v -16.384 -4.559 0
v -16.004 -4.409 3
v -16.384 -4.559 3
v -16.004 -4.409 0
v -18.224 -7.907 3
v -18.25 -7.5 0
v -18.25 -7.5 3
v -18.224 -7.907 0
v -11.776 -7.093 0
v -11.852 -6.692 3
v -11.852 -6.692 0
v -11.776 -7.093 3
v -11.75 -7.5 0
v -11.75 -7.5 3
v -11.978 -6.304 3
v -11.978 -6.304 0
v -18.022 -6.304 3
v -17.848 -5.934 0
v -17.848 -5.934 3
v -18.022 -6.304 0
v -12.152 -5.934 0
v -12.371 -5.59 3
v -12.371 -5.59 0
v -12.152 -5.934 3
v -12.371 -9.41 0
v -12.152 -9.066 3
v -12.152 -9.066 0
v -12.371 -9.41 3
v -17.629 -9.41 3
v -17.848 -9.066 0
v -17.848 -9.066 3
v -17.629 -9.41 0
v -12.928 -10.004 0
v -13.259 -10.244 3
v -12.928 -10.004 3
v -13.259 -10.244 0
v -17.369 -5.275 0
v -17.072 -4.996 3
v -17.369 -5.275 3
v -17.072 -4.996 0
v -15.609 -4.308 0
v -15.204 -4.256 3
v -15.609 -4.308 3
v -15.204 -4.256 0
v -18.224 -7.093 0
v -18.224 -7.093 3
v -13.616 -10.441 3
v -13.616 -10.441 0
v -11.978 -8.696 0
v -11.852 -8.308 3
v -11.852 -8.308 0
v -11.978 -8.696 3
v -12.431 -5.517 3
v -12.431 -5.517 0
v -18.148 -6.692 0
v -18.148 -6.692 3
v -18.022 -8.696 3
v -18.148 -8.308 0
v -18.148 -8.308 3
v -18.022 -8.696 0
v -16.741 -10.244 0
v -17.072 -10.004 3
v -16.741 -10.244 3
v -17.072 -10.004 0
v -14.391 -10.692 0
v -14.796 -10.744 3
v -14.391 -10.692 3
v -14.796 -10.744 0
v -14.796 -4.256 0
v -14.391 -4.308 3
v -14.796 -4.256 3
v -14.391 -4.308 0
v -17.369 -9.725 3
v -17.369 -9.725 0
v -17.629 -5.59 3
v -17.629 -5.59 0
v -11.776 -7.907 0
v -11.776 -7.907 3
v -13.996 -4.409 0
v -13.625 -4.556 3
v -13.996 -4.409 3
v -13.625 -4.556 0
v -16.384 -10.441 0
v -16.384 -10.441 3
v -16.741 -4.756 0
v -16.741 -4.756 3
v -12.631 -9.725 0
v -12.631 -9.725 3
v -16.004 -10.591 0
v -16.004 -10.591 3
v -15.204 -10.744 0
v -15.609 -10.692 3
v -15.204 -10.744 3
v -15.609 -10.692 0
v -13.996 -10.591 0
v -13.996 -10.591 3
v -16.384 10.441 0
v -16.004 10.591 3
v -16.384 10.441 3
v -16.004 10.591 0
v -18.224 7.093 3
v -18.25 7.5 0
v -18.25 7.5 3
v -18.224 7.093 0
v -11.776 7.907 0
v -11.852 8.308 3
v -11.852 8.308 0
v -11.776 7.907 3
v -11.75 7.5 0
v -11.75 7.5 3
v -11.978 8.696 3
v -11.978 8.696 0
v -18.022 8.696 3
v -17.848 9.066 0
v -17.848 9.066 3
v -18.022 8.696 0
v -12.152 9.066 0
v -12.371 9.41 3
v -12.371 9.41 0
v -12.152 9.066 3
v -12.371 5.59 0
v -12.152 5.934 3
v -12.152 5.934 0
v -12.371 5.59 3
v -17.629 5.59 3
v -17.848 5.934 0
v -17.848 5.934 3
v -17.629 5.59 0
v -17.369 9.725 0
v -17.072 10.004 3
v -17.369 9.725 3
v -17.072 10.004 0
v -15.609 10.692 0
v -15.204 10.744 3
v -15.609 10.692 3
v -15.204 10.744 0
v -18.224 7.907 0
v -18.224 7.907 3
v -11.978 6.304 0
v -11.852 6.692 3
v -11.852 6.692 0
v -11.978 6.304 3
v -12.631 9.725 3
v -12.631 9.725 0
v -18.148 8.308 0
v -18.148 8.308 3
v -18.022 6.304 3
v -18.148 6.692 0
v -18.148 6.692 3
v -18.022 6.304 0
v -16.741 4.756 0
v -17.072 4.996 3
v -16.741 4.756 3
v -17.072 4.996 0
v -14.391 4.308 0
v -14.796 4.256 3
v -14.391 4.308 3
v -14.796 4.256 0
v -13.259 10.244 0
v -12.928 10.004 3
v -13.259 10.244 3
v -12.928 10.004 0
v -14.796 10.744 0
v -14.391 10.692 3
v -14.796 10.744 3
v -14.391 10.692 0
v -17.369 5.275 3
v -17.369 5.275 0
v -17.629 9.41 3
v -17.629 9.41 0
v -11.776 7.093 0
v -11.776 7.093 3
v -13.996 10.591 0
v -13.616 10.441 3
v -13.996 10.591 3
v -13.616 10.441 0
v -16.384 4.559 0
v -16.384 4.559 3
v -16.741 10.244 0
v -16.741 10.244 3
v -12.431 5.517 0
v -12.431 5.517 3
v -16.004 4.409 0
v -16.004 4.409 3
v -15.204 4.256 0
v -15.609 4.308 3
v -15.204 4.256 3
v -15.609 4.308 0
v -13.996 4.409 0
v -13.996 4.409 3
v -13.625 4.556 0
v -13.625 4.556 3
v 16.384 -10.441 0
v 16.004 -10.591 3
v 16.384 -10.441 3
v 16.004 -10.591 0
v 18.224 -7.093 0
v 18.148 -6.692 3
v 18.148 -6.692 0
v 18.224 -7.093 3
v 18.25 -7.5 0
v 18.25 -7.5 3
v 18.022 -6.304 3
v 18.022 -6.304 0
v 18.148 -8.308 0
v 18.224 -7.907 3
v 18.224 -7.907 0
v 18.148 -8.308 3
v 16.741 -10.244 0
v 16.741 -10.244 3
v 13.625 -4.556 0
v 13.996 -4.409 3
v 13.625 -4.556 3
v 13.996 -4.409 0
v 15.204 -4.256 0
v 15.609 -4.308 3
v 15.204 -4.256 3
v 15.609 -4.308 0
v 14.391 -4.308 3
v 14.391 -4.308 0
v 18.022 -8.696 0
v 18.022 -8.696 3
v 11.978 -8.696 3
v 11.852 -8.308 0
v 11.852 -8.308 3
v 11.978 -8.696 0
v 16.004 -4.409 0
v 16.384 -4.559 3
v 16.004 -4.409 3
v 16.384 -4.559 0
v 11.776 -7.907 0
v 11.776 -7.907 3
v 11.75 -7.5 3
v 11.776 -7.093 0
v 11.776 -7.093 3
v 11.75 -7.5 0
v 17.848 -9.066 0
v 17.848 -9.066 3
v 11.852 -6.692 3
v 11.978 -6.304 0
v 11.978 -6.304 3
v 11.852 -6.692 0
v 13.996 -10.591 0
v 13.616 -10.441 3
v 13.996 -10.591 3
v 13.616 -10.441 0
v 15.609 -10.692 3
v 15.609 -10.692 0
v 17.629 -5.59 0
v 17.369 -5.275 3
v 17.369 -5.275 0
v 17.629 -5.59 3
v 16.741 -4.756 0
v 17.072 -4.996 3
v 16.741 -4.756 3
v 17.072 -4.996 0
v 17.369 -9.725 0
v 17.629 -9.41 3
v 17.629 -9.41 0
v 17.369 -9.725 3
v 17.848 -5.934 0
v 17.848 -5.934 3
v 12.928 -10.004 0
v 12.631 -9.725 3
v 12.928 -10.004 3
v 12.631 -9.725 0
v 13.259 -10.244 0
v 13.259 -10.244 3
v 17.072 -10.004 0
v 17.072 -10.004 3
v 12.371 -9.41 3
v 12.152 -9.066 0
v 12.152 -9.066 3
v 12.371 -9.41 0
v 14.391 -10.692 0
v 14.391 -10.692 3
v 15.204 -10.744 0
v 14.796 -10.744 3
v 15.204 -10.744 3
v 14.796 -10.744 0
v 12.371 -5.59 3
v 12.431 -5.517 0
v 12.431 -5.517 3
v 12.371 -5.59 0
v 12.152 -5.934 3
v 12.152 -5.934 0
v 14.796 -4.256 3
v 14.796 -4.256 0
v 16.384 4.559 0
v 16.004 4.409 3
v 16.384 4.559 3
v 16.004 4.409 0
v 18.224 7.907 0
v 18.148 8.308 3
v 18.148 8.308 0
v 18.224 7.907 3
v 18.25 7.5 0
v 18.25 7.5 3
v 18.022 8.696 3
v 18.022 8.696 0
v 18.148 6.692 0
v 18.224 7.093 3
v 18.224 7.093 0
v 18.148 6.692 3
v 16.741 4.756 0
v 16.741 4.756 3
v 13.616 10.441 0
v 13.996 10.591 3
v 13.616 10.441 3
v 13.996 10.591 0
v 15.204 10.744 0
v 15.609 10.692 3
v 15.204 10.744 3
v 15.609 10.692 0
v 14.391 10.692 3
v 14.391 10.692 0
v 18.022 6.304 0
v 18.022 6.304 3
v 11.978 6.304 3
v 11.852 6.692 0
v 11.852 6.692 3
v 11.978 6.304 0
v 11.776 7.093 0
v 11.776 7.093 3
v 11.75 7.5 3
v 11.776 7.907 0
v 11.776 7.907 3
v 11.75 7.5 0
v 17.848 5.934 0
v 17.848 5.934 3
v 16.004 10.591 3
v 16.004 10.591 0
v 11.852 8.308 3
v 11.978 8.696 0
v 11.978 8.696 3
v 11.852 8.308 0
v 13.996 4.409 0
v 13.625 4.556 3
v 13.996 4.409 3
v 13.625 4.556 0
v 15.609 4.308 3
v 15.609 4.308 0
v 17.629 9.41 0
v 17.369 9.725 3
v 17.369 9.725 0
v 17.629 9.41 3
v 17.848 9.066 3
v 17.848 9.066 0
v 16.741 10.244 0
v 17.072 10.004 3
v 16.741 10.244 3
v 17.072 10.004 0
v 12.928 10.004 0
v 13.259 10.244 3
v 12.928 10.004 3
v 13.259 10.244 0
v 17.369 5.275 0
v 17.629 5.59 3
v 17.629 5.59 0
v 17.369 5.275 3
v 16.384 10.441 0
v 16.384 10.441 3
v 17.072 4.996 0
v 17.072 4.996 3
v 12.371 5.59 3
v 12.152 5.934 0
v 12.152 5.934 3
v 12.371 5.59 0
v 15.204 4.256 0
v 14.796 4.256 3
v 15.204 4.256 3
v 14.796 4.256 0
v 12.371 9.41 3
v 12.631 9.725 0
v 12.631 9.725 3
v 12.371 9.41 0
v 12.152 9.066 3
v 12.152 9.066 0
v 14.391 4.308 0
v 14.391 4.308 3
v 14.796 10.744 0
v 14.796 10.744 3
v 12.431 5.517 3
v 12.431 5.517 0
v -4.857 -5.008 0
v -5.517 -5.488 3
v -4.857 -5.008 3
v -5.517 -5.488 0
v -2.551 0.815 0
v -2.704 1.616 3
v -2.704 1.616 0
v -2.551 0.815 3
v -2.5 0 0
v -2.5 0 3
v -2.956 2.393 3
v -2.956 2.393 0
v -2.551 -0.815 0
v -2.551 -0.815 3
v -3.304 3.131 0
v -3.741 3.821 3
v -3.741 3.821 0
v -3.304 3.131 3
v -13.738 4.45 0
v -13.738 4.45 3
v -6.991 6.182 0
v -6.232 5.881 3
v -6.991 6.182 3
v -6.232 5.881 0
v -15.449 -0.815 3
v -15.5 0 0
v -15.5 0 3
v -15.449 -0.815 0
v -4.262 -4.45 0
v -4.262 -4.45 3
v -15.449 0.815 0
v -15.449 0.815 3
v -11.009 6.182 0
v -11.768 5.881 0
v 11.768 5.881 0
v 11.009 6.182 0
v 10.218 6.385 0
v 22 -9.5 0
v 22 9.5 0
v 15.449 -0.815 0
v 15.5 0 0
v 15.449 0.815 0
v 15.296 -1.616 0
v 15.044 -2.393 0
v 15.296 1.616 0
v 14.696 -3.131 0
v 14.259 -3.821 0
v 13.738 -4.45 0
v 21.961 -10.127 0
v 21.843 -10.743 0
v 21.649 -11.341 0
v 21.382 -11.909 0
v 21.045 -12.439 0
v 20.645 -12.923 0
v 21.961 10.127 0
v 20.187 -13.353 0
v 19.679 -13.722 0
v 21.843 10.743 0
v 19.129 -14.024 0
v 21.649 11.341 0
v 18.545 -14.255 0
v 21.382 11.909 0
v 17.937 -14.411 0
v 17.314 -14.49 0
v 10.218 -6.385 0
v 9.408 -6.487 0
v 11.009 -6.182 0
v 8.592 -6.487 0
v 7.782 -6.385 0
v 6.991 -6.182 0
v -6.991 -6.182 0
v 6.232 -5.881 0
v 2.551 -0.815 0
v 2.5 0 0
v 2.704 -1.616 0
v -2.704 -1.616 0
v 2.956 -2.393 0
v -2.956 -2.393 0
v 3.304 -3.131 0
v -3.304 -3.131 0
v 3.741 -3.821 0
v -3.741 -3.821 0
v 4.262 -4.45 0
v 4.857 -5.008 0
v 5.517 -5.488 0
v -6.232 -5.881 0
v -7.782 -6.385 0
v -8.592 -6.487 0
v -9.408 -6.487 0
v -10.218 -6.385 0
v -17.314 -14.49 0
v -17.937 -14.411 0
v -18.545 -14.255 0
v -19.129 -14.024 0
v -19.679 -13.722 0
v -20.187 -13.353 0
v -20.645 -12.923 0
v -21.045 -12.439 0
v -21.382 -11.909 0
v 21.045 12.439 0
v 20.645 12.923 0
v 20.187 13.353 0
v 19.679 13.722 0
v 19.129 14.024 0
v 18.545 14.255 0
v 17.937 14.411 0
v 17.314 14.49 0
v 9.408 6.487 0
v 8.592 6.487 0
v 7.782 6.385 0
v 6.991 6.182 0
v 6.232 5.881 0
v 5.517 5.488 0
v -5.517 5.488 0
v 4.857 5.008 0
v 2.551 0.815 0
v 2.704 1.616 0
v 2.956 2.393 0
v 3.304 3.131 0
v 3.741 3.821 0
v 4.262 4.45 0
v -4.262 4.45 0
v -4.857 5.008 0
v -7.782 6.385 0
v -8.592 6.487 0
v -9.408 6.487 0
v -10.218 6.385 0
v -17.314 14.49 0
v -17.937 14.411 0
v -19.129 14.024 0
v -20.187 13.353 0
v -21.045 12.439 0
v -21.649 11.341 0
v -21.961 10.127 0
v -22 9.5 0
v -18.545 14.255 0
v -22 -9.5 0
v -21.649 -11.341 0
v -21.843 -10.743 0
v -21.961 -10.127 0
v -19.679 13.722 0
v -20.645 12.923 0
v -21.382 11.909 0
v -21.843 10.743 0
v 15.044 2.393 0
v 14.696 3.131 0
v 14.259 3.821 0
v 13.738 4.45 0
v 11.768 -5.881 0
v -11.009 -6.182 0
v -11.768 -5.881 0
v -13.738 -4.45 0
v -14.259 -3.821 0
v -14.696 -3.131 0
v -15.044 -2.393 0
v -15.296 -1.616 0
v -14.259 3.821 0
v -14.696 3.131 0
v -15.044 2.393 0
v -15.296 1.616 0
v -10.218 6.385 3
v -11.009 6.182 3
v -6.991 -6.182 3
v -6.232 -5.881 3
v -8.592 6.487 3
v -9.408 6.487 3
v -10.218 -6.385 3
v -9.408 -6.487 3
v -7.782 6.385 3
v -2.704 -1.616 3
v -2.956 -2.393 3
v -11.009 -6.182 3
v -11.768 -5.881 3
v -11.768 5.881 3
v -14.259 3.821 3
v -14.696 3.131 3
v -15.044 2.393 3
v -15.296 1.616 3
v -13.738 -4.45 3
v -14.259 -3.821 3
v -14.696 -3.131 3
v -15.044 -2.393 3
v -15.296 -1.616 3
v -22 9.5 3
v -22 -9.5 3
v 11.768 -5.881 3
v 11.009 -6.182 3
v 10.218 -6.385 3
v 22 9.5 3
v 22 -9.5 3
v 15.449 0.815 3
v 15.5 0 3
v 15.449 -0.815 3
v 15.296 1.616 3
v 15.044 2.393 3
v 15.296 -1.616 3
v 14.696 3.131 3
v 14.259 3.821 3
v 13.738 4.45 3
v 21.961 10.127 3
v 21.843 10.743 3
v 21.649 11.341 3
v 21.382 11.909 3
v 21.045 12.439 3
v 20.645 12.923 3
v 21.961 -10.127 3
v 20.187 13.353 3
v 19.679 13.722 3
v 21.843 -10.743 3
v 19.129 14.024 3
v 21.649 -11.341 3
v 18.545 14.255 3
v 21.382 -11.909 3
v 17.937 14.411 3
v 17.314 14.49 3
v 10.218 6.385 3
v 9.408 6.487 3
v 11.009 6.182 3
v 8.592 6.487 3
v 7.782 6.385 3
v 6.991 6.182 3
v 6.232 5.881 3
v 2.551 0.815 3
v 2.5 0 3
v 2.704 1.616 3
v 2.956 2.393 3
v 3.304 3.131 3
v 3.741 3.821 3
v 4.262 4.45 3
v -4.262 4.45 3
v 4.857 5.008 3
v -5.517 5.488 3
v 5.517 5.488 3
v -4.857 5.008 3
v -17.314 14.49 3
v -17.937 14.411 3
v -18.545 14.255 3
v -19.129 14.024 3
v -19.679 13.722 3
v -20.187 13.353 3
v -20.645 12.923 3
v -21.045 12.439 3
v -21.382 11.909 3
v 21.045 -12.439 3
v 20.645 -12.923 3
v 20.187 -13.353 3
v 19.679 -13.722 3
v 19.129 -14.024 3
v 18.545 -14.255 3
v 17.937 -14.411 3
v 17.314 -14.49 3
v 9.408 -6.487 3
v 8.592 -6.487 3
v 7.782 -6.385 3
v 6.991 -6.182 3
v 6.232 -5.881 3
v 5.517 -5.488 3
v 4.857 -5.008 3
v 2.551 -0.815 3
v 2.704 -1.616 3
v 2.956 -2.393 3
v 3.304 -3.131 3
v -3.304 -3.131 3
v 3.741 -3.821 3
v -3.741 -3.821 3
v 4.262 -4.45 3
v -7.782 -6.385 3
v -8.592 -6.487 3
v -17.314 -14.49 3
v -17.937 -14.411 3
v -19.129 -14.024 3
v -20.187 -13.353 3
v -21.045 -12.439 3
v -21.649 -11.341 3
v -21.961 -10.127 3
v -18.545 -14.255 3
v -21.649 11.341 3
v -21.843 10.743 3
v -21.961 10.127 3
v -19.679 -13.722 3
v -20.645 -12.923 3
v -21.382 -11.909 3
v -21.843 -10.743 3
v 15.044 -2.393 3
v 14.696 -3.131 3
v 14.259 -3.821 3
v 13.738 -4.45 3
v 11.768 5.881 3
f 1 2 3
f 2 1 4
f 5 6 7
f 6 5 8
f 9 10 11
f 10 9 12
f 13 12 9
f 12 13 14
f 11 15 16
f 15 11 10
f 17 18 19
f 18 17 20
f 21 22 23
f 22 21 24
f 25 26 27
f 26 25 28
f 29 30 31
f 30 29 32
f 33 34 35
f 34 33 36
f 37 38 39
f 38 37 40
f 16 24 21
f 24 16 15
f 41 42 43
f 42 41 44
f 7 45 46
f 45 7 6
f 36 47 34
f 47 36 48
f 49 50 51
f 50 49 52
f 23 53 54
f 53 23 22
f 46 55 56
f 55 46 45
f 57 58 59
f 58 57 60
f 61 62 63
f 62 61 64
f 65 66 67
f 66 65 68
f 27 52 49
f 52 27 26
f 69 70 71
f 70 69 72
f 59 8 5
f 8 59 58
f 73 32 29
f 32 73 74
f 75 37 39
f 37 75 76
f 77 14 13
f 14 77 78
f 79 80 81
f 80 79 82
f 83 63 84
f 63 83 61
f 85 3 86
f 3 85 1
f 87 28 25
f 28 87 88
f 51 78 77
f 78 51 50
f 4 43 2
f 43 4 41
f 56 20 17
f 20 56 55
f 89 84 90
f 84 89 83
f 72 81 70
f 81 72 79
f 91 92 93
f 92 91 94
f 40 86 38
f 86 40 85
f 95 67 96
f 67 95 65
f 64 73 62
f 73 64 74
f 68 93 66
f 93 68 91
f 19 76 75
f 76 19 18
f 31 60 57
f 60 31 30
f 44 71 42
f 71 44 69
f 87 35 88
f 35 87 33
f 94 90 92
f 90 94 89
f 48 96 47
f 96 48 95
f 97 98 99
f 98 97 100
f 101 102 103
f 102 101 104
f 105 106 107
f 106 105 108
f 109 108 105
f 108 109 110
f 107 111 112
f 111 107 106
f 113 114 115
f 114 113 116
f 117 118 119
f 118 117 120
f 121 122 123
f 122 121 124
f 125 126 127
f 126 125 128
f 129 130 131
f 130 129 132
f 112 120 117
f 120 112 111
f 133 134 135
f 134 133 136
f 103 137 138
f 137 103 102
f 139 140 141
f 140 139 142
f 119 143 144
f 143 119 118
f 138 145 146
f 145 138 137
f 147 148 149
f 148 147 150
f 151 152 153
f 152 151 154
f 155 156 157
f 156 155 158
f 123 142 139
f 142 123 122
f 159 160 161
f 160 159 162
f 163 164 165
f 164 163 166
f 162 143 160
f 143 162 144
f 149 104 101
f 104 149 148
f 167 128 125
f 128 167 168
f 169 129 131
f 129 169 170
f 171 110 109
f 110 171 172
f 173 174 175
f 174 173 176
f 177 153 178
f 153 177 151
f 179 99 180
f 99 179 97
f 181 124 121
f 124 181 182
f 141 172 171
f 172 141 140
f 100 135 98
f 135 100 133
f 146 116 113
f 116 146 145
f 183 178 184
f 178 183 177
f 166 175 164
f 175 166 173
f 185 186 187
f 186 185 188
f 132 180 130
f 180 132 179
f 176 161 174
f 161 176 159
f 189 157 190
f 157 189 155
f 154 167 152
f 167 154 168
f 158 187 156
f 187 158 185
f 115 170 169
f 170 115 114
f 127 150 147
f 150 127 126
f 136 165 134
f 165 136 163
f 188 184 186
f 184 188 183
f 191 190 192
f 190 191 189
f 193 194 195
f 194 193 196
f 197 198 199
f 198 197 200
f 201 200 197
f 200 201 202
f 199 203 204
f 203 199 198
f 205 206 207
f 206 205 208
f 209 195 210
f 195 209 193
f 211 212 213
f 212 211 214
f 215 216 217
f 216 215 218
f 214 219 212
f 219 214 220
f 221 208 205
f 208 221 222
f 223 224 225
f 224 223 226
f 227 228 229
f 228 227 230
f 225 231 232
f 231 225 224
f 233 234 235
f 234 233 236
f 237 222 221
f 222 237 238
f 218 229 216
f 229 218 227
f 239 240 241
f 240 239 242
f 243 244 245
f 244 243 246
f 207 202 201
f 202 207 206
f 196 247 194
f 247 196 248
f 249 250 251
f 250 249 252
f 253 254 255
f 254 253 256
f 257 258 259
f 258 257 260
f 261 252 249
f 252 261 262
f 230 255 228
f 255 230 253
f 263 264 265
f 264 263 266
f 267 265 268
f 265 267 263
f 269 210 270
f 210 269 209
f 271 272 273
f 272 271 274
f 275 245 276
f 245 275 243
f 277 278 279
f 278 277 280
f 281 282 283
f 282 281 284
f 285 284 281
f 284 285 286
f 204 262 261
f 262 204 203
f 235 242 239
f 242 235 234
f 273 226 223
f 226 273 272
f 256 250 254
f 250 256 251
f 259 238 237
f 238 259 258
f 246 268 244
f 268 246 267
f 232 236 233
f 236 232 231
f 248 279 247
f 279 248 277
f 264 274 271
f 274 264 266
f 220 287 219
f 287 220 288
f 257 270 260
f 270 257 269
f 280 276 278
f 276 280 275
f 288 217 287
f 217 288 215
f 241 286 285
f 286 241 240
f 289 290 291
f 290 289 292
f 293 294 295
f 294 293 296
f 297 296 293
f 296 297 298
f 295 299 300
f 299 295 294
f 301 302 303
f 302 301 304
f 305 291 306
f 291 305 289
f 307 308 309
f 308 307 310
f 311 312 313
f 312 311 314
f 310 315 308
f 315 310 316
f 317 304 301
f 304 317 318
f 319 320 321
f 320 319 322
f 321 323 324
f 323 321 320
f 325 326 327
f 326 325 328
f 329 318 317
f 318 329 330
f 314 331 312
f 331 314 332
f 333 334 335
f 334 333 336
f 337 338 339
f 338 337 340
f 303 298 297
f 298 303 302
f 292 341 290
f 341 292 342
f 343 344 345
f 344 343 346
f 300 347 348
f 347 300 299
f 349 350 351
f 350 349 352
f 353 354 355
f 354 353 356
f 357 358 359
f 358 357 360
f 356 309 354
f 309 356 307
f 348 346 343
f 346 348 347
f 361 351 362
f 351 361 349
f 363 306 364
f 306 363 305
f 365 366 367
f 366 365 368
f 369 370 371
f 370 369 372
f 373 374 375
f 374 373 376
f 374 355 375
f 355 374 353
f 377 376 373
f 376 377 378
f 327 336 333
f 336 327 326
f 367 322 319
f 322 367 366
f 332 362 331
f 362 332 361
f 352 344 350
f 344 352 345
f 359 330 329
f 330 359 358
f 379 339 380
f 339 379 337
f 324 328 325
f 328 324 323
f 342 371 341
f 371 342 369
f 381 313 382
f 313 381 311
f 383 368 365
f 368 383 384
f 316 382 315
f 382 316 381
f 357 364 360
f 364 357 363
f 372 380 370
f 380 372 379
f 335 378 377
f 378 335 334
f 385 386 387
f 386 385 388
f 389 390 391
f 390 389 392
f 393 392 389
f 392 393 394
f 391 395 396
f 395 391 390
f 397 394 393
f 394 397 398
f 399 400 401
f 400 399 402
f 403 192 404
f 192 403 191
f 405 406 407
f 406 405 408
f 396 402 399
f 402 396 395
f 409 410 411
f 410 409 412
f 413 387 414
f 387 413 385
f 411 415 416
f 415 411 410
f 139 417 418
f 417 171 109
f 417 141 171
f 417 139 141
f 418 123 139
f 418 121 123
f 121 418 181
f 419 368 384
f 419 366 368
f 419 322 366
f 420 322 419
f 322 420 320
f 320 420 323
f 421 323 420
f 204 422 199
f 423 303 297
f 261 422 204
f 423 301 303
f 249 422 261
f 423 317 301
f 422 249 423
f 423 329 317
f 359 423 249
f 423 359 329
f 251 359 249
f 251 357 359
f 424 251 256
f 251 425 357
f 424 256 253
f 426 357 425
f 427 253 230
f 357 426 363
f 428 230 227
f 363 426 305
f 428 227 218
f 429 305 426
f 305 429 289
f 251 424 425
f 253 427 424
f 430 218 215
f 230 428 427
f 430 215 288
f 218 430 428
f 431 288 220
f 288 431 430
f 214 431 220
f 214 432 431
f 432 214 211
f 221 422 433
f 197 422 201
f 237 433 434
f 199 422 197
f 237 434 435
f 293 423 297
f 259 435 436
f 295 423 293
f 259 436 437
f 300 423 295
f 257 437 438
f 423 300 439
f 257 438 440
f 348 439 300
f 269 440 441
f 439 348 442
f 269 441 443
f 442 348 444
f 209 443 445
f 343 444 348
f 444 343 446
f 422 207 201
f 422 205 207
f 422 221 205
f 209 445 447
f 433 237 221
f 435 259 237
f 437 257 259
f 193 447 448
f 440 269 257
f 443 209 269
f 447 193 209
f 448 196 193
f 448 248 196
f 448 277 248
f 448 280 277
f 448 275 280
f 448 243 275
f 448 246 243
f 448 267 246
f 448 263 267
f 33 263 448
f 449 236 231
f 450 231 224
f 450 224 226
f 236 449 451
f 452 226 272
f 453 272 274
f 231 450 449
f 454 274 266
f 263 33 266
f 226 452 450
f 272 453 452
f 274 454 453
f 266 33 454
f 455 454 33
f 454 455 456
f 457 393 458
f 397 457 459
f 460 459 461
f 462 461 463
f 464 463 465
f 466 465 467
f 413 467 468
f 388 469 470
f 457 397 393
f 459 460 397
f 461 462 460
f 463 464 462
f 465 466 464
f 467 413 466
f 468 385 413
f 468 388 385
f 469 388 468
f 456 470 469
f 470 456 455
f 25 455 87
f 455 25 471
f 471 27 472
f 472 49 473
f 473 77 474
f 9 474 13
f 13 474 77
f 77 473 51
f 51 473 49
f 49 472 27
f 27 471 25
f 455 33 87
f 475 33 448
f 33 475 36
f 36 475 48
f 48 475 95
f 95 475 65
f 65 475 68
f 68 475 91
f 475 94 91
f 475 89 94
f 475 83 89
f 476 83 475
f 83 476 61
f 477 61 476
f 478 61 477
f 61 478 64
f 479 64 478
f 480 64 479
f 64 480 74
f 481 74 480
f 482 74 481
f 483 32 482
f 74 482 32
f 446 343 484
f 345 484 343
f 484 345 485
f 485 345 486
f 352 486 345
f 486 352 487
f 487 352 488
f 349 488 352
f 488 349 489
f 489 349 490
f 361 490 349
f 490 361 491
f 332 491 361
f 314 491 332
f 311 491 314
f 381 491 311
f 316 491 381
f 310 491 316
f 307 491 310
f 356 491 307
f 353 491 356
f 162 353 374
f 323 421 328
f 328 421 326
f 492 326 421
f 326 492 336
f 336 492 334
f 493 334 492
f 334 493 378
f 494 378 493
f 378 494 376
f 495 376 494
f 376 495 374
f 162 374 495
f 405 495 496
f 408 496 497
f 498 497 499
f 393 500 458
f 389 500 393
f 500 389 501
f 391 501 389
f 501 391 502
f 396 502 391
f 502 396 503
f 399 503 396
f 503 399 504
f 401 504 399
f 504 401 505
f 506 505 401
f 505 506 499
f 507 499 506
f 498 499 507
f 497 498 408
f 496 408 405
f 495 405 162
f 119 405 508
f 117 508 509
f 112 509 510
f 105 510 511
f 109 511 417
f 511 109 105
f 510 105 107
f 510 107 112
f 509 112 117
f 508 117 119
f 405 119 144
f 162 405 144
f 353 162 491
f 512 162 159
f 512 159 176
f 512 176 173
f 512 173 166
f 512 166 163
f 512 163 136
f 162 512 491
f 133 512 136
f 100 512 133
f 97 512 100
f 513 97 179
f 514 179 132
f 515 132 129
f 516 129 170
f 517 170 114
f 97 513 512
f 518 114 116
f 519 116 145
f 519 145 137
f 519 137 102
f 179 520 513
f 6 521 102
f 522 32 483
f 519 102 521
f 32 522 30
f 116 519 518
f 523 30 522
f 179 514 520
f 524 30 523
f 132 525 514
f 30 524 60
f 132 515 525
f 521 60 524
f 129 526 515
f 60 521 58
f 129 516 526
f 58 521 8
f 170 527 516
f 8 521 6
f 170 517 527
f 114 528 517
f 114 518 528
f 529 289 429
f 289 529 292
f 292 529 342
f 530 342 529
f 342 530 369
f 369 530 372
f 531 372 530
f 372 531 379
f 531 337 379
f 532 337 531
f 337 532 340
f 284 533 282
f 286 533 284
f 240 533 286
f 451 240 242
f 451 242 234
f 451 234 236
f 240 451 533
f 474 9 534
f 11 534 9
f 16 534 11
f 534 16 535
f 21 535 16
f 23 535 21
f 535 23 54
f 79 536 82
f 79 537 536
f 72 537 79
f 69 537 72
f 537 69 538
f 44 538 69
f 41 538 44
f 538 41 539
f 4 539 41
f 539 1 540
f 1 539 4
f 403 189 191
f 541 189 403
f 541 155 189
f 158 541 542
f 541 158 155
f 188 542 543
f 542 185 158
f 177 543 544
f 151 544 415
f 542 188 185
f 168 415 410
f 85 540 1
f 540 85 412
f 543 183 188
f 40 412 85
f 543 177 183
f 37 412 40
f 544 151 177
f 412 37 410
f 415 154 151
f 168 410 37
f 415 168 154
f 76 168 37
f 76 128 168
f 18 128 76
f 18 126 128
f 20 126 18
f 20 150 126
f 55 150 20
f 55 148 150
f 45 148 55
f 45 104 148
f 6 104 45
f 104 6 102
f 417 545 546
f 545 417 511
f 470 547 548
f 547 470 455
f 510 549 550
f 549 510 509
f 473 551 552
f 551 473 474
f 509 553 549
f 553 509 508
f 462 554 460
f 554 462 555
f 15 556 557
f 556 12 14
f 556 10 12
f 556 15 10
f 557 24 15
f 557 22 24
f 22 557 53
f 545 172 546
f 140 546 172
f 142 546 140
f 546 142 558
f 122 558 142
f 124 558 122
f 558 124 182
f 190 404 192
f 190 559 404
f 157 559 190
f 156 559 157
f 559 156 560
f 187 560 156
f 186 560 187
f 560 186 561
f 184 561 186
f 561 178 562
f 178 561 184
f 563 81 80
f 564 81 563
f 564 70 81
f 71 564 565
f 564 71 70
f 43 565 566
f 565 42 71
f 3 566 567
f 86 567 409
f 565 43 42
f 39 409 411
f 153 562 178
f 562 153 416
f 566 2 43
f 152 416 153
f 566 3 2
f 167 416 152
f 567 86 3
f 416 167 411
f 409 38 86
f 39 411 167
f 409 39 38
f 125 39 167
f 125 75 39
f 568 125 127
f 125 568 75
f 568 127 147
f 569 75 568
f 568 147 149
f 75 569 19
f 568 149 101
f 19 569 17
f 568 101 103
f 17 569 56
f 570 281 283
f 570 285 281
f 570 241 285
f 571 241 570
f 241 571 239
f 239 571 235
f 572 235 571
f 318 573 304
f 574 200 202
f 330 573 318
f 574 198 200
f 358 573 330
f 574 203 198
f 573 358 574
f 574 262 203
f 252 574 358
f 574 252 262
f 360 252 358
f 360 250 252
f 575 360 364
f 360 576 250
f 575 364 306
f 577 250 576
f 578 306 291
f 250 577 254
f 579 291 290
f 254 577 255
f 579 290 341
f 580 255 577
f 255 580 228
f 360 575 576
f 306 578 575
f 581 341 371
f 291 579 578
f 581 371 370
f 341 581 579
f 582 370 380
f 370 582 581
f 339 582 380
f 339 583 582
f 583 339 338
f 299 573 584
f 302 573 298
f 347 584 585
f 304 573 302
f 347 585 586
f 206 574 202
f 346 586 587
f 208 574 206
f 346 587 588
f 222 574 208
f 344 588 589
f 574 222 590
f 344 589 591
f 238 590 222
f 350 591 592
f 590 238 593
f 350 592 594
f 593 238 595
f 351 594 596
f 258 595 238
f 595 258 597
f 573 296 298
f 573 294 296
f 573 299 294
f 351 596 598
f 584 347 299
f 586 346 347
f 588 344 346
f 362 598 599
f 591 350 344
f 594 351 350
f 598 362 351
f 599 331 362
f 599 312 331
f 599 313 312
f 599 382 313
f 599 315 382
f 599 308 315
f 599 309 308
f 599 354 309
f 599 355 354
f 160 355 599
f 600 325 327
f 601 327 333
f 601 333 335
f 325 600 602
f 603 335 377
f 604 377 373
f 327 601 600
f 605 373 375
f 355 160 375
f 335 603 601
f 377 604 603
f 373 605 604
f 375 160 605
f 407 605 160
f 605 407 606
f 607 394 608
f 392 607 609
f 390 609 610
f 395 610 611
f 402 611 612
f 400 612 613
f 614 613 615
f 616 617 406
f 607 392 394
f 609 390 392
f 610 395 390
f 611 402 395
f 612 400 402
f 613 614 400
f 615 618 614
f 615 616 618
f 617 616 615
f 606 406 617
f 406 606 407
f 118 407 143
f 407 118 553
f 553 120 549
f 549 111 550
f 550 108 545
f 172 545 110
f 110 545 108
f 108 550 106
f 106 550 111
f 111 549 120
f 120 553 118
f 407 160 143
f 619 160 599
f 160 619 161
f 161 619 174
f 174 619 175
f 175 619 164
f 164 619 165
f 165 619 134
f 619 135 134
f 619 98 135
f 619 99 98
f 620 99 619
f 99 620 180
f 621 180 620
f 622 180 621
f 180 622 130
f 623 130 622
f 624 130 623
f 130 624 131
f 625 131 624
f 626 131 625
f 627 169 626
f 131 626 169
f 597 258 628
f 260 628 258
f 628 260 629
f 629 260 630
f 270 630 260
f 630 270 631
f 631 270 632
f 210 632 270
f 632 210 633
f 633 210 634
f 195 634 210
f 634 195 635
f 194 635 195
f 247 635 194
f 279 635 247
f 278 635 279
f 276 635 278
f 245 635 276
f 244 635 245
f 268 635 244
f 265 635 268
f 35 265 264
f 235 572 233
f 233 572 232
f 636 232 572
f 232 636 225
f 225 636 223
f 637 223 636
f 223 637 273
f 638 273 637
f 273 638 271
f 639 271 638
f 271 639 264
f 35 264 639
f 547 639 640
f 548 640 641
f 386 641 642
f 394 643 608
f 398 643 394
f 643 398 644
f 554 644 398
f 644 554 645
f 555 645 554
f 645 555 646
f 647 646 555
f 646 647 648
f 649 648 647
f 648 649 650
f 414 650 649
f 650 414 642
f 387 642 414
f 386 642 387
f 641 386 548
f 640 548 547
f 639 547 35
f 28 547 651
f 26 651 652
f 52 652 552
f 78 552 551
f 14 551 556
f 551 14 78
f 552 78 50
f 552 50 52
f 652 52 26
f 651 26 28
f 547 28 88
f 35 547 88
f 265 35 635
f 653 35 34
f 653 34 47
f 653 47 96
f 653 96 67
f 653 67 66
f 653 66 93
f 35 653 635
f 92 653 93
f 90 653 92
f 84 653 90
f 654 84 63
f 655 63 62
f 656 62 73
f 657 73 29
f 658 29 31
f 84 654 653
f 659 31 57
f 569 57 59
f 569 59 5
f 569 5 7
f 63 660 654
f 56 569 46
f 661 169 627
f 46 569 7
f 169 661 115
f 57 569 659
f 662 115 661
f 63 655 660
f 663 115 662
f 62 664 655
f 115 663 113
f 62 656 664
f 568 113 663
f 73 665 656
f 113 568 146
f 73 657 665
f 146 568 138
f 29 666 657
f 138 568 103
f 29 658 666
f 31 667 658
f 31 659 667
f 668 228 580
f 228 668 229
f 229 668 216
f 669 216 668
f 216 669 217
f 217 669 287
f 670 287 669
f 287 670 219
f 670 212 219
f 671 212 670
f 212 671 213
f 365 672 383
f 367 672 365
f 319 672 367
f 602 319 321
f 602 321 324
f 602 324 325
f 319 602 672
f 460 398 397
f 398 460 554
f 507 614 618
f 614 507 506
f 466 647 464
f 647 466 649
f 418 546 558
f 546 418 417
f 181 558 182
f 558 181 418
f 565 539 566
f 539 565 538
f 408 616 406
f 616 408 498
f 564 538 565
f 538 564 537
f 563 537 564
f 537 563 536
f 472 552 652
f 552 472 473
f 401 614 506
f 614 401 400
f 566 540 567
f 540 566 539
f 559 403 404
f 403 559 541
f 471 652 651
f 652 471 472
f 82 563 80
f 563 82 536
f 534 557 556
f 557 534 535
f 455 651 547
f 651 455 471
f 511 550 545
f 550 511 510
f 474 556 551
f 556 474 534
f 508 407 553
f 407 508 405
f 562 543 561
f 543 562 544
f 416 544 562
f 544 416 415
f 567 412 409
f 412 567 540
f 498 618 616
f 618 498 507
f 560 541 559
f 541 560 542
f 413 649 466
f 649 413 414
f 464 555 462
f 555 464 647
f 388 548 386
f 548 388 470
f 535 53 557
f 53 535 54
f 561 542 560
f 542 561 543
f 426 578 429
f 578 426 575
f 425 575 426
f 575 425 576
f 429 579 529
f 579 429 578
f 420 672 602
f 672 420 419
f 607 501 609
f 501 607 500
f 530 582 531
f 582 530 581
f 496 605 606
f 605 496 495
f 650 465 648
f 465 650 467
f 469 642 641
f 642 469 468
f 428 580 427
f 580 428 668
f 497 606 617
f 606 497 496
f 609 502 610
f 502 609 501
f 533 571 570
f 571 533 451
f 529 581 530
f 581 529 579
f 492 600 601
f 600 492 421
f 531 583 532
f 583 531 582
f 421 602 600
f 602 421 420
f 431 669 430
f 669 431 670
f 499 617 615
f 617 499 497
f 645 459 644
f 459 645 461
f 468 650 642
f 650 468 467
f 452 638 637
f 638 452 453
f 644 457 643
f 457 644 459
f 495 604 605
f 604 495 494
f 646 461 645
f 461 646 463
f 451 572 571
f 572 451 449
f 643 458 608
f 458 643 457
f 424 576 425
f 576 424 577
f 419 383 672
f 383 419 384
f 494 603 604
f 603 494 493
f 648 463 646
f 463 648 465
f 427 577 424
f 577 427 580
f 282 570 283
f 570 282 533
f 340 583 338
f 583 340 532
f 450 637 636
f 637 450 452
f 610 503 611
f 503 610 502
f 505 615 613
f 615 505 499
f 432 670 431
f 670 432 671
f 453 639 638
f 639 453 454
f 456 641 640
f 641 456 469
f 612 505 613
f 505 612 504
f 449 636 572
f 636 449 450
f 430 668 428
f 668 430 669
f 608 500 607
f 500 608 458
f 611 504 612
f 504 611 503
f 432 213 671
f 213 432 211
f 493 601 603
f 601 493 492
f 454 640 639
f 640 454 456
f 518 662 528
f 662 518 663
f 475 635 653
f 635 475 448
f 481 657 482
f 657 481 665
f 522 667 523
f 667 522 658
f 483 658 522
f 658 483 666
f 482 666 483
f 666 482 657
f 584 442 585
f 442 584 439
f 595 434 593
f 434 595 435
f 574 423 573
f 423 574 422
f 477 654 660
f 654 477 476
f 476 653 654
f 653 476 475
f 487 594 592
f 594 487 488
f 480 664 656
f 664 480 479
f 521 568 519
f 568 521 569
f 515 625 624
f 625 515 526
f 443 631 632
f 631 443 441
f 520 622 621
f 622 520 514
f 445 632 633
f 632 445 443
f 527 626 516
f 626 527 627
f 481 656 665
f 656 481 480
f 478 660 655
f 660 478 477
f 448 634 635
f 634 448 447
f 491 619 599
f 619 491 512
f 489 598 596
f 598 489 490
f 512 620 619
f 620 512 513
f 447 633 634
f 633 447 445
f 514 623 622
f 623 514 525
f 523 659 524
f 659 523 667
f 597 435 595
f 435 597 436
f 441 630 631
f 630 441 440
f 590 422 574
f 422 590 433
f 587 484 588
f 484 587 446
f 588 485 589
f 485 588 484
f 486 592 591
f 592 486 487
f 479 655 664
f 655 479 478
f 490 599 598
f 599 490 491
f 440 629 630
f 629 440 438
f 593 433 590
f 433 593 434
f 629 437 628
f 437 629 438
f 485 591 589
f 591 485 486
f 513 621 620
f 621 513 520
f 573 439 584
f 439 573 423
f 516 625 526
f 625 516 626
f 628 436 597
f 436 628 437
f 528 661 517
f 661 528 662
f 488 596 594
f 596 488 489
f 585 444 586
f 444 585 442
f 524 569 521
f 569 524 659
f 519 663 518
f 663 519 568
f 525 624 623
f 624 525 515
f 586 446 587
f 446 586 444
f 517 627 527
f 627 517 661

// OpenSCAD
$fn = 50;


difference() {
	union() {
		hull() {
			translate(v = [-17.0000000000, 9.5000000000, 0]) {
				cylinder(h = 3, r = 5);
			}
			translate(v = [17.0000000000, 9.5000000000, 0]) {
				cylinder(h = 3, r = 5);
			}
			translate(v = [-17.0000000000, -9.5000000000, 0]) {
				cylinder(h = 3, r = 5);
			}
			translate(v = [17.0000000000, -9.5000000000, 0]) {
				cylinder(h = 3, r = 5);
			}
		}
	}
	union() {
		#translate(v = [-15.0000000000, -7.5000000000, -100.0000000000]) {
			cylinder(h = 200, r = 3.2500000000);
		}
		#translate(v = [-15.0000000000, 7.5000000000, -100.0000000000]) {
			cylinder(h = 200, r = 3.2500000000);
		}
		#translate(v = [15.0000000000, -7.5000000000, -100.0000000000]) {
			cylinder(h = 200, r = 3.2500000000);
		}
		#translate(v = [15.0000000000, 7.5000000000, -100.0000000000]) {
			cylinder(h = 200, r = 3.2500000000);
		}
		#translate(v = [-9.0000000000, 0, 0]) {
			cylinder(h = 3, r = 6.5000000000);
		}
		#translate(v = [9.0000000000, 0, 0]) {
			cylinder(h = 3, r = 6.5000000000);
		}
	}
}
